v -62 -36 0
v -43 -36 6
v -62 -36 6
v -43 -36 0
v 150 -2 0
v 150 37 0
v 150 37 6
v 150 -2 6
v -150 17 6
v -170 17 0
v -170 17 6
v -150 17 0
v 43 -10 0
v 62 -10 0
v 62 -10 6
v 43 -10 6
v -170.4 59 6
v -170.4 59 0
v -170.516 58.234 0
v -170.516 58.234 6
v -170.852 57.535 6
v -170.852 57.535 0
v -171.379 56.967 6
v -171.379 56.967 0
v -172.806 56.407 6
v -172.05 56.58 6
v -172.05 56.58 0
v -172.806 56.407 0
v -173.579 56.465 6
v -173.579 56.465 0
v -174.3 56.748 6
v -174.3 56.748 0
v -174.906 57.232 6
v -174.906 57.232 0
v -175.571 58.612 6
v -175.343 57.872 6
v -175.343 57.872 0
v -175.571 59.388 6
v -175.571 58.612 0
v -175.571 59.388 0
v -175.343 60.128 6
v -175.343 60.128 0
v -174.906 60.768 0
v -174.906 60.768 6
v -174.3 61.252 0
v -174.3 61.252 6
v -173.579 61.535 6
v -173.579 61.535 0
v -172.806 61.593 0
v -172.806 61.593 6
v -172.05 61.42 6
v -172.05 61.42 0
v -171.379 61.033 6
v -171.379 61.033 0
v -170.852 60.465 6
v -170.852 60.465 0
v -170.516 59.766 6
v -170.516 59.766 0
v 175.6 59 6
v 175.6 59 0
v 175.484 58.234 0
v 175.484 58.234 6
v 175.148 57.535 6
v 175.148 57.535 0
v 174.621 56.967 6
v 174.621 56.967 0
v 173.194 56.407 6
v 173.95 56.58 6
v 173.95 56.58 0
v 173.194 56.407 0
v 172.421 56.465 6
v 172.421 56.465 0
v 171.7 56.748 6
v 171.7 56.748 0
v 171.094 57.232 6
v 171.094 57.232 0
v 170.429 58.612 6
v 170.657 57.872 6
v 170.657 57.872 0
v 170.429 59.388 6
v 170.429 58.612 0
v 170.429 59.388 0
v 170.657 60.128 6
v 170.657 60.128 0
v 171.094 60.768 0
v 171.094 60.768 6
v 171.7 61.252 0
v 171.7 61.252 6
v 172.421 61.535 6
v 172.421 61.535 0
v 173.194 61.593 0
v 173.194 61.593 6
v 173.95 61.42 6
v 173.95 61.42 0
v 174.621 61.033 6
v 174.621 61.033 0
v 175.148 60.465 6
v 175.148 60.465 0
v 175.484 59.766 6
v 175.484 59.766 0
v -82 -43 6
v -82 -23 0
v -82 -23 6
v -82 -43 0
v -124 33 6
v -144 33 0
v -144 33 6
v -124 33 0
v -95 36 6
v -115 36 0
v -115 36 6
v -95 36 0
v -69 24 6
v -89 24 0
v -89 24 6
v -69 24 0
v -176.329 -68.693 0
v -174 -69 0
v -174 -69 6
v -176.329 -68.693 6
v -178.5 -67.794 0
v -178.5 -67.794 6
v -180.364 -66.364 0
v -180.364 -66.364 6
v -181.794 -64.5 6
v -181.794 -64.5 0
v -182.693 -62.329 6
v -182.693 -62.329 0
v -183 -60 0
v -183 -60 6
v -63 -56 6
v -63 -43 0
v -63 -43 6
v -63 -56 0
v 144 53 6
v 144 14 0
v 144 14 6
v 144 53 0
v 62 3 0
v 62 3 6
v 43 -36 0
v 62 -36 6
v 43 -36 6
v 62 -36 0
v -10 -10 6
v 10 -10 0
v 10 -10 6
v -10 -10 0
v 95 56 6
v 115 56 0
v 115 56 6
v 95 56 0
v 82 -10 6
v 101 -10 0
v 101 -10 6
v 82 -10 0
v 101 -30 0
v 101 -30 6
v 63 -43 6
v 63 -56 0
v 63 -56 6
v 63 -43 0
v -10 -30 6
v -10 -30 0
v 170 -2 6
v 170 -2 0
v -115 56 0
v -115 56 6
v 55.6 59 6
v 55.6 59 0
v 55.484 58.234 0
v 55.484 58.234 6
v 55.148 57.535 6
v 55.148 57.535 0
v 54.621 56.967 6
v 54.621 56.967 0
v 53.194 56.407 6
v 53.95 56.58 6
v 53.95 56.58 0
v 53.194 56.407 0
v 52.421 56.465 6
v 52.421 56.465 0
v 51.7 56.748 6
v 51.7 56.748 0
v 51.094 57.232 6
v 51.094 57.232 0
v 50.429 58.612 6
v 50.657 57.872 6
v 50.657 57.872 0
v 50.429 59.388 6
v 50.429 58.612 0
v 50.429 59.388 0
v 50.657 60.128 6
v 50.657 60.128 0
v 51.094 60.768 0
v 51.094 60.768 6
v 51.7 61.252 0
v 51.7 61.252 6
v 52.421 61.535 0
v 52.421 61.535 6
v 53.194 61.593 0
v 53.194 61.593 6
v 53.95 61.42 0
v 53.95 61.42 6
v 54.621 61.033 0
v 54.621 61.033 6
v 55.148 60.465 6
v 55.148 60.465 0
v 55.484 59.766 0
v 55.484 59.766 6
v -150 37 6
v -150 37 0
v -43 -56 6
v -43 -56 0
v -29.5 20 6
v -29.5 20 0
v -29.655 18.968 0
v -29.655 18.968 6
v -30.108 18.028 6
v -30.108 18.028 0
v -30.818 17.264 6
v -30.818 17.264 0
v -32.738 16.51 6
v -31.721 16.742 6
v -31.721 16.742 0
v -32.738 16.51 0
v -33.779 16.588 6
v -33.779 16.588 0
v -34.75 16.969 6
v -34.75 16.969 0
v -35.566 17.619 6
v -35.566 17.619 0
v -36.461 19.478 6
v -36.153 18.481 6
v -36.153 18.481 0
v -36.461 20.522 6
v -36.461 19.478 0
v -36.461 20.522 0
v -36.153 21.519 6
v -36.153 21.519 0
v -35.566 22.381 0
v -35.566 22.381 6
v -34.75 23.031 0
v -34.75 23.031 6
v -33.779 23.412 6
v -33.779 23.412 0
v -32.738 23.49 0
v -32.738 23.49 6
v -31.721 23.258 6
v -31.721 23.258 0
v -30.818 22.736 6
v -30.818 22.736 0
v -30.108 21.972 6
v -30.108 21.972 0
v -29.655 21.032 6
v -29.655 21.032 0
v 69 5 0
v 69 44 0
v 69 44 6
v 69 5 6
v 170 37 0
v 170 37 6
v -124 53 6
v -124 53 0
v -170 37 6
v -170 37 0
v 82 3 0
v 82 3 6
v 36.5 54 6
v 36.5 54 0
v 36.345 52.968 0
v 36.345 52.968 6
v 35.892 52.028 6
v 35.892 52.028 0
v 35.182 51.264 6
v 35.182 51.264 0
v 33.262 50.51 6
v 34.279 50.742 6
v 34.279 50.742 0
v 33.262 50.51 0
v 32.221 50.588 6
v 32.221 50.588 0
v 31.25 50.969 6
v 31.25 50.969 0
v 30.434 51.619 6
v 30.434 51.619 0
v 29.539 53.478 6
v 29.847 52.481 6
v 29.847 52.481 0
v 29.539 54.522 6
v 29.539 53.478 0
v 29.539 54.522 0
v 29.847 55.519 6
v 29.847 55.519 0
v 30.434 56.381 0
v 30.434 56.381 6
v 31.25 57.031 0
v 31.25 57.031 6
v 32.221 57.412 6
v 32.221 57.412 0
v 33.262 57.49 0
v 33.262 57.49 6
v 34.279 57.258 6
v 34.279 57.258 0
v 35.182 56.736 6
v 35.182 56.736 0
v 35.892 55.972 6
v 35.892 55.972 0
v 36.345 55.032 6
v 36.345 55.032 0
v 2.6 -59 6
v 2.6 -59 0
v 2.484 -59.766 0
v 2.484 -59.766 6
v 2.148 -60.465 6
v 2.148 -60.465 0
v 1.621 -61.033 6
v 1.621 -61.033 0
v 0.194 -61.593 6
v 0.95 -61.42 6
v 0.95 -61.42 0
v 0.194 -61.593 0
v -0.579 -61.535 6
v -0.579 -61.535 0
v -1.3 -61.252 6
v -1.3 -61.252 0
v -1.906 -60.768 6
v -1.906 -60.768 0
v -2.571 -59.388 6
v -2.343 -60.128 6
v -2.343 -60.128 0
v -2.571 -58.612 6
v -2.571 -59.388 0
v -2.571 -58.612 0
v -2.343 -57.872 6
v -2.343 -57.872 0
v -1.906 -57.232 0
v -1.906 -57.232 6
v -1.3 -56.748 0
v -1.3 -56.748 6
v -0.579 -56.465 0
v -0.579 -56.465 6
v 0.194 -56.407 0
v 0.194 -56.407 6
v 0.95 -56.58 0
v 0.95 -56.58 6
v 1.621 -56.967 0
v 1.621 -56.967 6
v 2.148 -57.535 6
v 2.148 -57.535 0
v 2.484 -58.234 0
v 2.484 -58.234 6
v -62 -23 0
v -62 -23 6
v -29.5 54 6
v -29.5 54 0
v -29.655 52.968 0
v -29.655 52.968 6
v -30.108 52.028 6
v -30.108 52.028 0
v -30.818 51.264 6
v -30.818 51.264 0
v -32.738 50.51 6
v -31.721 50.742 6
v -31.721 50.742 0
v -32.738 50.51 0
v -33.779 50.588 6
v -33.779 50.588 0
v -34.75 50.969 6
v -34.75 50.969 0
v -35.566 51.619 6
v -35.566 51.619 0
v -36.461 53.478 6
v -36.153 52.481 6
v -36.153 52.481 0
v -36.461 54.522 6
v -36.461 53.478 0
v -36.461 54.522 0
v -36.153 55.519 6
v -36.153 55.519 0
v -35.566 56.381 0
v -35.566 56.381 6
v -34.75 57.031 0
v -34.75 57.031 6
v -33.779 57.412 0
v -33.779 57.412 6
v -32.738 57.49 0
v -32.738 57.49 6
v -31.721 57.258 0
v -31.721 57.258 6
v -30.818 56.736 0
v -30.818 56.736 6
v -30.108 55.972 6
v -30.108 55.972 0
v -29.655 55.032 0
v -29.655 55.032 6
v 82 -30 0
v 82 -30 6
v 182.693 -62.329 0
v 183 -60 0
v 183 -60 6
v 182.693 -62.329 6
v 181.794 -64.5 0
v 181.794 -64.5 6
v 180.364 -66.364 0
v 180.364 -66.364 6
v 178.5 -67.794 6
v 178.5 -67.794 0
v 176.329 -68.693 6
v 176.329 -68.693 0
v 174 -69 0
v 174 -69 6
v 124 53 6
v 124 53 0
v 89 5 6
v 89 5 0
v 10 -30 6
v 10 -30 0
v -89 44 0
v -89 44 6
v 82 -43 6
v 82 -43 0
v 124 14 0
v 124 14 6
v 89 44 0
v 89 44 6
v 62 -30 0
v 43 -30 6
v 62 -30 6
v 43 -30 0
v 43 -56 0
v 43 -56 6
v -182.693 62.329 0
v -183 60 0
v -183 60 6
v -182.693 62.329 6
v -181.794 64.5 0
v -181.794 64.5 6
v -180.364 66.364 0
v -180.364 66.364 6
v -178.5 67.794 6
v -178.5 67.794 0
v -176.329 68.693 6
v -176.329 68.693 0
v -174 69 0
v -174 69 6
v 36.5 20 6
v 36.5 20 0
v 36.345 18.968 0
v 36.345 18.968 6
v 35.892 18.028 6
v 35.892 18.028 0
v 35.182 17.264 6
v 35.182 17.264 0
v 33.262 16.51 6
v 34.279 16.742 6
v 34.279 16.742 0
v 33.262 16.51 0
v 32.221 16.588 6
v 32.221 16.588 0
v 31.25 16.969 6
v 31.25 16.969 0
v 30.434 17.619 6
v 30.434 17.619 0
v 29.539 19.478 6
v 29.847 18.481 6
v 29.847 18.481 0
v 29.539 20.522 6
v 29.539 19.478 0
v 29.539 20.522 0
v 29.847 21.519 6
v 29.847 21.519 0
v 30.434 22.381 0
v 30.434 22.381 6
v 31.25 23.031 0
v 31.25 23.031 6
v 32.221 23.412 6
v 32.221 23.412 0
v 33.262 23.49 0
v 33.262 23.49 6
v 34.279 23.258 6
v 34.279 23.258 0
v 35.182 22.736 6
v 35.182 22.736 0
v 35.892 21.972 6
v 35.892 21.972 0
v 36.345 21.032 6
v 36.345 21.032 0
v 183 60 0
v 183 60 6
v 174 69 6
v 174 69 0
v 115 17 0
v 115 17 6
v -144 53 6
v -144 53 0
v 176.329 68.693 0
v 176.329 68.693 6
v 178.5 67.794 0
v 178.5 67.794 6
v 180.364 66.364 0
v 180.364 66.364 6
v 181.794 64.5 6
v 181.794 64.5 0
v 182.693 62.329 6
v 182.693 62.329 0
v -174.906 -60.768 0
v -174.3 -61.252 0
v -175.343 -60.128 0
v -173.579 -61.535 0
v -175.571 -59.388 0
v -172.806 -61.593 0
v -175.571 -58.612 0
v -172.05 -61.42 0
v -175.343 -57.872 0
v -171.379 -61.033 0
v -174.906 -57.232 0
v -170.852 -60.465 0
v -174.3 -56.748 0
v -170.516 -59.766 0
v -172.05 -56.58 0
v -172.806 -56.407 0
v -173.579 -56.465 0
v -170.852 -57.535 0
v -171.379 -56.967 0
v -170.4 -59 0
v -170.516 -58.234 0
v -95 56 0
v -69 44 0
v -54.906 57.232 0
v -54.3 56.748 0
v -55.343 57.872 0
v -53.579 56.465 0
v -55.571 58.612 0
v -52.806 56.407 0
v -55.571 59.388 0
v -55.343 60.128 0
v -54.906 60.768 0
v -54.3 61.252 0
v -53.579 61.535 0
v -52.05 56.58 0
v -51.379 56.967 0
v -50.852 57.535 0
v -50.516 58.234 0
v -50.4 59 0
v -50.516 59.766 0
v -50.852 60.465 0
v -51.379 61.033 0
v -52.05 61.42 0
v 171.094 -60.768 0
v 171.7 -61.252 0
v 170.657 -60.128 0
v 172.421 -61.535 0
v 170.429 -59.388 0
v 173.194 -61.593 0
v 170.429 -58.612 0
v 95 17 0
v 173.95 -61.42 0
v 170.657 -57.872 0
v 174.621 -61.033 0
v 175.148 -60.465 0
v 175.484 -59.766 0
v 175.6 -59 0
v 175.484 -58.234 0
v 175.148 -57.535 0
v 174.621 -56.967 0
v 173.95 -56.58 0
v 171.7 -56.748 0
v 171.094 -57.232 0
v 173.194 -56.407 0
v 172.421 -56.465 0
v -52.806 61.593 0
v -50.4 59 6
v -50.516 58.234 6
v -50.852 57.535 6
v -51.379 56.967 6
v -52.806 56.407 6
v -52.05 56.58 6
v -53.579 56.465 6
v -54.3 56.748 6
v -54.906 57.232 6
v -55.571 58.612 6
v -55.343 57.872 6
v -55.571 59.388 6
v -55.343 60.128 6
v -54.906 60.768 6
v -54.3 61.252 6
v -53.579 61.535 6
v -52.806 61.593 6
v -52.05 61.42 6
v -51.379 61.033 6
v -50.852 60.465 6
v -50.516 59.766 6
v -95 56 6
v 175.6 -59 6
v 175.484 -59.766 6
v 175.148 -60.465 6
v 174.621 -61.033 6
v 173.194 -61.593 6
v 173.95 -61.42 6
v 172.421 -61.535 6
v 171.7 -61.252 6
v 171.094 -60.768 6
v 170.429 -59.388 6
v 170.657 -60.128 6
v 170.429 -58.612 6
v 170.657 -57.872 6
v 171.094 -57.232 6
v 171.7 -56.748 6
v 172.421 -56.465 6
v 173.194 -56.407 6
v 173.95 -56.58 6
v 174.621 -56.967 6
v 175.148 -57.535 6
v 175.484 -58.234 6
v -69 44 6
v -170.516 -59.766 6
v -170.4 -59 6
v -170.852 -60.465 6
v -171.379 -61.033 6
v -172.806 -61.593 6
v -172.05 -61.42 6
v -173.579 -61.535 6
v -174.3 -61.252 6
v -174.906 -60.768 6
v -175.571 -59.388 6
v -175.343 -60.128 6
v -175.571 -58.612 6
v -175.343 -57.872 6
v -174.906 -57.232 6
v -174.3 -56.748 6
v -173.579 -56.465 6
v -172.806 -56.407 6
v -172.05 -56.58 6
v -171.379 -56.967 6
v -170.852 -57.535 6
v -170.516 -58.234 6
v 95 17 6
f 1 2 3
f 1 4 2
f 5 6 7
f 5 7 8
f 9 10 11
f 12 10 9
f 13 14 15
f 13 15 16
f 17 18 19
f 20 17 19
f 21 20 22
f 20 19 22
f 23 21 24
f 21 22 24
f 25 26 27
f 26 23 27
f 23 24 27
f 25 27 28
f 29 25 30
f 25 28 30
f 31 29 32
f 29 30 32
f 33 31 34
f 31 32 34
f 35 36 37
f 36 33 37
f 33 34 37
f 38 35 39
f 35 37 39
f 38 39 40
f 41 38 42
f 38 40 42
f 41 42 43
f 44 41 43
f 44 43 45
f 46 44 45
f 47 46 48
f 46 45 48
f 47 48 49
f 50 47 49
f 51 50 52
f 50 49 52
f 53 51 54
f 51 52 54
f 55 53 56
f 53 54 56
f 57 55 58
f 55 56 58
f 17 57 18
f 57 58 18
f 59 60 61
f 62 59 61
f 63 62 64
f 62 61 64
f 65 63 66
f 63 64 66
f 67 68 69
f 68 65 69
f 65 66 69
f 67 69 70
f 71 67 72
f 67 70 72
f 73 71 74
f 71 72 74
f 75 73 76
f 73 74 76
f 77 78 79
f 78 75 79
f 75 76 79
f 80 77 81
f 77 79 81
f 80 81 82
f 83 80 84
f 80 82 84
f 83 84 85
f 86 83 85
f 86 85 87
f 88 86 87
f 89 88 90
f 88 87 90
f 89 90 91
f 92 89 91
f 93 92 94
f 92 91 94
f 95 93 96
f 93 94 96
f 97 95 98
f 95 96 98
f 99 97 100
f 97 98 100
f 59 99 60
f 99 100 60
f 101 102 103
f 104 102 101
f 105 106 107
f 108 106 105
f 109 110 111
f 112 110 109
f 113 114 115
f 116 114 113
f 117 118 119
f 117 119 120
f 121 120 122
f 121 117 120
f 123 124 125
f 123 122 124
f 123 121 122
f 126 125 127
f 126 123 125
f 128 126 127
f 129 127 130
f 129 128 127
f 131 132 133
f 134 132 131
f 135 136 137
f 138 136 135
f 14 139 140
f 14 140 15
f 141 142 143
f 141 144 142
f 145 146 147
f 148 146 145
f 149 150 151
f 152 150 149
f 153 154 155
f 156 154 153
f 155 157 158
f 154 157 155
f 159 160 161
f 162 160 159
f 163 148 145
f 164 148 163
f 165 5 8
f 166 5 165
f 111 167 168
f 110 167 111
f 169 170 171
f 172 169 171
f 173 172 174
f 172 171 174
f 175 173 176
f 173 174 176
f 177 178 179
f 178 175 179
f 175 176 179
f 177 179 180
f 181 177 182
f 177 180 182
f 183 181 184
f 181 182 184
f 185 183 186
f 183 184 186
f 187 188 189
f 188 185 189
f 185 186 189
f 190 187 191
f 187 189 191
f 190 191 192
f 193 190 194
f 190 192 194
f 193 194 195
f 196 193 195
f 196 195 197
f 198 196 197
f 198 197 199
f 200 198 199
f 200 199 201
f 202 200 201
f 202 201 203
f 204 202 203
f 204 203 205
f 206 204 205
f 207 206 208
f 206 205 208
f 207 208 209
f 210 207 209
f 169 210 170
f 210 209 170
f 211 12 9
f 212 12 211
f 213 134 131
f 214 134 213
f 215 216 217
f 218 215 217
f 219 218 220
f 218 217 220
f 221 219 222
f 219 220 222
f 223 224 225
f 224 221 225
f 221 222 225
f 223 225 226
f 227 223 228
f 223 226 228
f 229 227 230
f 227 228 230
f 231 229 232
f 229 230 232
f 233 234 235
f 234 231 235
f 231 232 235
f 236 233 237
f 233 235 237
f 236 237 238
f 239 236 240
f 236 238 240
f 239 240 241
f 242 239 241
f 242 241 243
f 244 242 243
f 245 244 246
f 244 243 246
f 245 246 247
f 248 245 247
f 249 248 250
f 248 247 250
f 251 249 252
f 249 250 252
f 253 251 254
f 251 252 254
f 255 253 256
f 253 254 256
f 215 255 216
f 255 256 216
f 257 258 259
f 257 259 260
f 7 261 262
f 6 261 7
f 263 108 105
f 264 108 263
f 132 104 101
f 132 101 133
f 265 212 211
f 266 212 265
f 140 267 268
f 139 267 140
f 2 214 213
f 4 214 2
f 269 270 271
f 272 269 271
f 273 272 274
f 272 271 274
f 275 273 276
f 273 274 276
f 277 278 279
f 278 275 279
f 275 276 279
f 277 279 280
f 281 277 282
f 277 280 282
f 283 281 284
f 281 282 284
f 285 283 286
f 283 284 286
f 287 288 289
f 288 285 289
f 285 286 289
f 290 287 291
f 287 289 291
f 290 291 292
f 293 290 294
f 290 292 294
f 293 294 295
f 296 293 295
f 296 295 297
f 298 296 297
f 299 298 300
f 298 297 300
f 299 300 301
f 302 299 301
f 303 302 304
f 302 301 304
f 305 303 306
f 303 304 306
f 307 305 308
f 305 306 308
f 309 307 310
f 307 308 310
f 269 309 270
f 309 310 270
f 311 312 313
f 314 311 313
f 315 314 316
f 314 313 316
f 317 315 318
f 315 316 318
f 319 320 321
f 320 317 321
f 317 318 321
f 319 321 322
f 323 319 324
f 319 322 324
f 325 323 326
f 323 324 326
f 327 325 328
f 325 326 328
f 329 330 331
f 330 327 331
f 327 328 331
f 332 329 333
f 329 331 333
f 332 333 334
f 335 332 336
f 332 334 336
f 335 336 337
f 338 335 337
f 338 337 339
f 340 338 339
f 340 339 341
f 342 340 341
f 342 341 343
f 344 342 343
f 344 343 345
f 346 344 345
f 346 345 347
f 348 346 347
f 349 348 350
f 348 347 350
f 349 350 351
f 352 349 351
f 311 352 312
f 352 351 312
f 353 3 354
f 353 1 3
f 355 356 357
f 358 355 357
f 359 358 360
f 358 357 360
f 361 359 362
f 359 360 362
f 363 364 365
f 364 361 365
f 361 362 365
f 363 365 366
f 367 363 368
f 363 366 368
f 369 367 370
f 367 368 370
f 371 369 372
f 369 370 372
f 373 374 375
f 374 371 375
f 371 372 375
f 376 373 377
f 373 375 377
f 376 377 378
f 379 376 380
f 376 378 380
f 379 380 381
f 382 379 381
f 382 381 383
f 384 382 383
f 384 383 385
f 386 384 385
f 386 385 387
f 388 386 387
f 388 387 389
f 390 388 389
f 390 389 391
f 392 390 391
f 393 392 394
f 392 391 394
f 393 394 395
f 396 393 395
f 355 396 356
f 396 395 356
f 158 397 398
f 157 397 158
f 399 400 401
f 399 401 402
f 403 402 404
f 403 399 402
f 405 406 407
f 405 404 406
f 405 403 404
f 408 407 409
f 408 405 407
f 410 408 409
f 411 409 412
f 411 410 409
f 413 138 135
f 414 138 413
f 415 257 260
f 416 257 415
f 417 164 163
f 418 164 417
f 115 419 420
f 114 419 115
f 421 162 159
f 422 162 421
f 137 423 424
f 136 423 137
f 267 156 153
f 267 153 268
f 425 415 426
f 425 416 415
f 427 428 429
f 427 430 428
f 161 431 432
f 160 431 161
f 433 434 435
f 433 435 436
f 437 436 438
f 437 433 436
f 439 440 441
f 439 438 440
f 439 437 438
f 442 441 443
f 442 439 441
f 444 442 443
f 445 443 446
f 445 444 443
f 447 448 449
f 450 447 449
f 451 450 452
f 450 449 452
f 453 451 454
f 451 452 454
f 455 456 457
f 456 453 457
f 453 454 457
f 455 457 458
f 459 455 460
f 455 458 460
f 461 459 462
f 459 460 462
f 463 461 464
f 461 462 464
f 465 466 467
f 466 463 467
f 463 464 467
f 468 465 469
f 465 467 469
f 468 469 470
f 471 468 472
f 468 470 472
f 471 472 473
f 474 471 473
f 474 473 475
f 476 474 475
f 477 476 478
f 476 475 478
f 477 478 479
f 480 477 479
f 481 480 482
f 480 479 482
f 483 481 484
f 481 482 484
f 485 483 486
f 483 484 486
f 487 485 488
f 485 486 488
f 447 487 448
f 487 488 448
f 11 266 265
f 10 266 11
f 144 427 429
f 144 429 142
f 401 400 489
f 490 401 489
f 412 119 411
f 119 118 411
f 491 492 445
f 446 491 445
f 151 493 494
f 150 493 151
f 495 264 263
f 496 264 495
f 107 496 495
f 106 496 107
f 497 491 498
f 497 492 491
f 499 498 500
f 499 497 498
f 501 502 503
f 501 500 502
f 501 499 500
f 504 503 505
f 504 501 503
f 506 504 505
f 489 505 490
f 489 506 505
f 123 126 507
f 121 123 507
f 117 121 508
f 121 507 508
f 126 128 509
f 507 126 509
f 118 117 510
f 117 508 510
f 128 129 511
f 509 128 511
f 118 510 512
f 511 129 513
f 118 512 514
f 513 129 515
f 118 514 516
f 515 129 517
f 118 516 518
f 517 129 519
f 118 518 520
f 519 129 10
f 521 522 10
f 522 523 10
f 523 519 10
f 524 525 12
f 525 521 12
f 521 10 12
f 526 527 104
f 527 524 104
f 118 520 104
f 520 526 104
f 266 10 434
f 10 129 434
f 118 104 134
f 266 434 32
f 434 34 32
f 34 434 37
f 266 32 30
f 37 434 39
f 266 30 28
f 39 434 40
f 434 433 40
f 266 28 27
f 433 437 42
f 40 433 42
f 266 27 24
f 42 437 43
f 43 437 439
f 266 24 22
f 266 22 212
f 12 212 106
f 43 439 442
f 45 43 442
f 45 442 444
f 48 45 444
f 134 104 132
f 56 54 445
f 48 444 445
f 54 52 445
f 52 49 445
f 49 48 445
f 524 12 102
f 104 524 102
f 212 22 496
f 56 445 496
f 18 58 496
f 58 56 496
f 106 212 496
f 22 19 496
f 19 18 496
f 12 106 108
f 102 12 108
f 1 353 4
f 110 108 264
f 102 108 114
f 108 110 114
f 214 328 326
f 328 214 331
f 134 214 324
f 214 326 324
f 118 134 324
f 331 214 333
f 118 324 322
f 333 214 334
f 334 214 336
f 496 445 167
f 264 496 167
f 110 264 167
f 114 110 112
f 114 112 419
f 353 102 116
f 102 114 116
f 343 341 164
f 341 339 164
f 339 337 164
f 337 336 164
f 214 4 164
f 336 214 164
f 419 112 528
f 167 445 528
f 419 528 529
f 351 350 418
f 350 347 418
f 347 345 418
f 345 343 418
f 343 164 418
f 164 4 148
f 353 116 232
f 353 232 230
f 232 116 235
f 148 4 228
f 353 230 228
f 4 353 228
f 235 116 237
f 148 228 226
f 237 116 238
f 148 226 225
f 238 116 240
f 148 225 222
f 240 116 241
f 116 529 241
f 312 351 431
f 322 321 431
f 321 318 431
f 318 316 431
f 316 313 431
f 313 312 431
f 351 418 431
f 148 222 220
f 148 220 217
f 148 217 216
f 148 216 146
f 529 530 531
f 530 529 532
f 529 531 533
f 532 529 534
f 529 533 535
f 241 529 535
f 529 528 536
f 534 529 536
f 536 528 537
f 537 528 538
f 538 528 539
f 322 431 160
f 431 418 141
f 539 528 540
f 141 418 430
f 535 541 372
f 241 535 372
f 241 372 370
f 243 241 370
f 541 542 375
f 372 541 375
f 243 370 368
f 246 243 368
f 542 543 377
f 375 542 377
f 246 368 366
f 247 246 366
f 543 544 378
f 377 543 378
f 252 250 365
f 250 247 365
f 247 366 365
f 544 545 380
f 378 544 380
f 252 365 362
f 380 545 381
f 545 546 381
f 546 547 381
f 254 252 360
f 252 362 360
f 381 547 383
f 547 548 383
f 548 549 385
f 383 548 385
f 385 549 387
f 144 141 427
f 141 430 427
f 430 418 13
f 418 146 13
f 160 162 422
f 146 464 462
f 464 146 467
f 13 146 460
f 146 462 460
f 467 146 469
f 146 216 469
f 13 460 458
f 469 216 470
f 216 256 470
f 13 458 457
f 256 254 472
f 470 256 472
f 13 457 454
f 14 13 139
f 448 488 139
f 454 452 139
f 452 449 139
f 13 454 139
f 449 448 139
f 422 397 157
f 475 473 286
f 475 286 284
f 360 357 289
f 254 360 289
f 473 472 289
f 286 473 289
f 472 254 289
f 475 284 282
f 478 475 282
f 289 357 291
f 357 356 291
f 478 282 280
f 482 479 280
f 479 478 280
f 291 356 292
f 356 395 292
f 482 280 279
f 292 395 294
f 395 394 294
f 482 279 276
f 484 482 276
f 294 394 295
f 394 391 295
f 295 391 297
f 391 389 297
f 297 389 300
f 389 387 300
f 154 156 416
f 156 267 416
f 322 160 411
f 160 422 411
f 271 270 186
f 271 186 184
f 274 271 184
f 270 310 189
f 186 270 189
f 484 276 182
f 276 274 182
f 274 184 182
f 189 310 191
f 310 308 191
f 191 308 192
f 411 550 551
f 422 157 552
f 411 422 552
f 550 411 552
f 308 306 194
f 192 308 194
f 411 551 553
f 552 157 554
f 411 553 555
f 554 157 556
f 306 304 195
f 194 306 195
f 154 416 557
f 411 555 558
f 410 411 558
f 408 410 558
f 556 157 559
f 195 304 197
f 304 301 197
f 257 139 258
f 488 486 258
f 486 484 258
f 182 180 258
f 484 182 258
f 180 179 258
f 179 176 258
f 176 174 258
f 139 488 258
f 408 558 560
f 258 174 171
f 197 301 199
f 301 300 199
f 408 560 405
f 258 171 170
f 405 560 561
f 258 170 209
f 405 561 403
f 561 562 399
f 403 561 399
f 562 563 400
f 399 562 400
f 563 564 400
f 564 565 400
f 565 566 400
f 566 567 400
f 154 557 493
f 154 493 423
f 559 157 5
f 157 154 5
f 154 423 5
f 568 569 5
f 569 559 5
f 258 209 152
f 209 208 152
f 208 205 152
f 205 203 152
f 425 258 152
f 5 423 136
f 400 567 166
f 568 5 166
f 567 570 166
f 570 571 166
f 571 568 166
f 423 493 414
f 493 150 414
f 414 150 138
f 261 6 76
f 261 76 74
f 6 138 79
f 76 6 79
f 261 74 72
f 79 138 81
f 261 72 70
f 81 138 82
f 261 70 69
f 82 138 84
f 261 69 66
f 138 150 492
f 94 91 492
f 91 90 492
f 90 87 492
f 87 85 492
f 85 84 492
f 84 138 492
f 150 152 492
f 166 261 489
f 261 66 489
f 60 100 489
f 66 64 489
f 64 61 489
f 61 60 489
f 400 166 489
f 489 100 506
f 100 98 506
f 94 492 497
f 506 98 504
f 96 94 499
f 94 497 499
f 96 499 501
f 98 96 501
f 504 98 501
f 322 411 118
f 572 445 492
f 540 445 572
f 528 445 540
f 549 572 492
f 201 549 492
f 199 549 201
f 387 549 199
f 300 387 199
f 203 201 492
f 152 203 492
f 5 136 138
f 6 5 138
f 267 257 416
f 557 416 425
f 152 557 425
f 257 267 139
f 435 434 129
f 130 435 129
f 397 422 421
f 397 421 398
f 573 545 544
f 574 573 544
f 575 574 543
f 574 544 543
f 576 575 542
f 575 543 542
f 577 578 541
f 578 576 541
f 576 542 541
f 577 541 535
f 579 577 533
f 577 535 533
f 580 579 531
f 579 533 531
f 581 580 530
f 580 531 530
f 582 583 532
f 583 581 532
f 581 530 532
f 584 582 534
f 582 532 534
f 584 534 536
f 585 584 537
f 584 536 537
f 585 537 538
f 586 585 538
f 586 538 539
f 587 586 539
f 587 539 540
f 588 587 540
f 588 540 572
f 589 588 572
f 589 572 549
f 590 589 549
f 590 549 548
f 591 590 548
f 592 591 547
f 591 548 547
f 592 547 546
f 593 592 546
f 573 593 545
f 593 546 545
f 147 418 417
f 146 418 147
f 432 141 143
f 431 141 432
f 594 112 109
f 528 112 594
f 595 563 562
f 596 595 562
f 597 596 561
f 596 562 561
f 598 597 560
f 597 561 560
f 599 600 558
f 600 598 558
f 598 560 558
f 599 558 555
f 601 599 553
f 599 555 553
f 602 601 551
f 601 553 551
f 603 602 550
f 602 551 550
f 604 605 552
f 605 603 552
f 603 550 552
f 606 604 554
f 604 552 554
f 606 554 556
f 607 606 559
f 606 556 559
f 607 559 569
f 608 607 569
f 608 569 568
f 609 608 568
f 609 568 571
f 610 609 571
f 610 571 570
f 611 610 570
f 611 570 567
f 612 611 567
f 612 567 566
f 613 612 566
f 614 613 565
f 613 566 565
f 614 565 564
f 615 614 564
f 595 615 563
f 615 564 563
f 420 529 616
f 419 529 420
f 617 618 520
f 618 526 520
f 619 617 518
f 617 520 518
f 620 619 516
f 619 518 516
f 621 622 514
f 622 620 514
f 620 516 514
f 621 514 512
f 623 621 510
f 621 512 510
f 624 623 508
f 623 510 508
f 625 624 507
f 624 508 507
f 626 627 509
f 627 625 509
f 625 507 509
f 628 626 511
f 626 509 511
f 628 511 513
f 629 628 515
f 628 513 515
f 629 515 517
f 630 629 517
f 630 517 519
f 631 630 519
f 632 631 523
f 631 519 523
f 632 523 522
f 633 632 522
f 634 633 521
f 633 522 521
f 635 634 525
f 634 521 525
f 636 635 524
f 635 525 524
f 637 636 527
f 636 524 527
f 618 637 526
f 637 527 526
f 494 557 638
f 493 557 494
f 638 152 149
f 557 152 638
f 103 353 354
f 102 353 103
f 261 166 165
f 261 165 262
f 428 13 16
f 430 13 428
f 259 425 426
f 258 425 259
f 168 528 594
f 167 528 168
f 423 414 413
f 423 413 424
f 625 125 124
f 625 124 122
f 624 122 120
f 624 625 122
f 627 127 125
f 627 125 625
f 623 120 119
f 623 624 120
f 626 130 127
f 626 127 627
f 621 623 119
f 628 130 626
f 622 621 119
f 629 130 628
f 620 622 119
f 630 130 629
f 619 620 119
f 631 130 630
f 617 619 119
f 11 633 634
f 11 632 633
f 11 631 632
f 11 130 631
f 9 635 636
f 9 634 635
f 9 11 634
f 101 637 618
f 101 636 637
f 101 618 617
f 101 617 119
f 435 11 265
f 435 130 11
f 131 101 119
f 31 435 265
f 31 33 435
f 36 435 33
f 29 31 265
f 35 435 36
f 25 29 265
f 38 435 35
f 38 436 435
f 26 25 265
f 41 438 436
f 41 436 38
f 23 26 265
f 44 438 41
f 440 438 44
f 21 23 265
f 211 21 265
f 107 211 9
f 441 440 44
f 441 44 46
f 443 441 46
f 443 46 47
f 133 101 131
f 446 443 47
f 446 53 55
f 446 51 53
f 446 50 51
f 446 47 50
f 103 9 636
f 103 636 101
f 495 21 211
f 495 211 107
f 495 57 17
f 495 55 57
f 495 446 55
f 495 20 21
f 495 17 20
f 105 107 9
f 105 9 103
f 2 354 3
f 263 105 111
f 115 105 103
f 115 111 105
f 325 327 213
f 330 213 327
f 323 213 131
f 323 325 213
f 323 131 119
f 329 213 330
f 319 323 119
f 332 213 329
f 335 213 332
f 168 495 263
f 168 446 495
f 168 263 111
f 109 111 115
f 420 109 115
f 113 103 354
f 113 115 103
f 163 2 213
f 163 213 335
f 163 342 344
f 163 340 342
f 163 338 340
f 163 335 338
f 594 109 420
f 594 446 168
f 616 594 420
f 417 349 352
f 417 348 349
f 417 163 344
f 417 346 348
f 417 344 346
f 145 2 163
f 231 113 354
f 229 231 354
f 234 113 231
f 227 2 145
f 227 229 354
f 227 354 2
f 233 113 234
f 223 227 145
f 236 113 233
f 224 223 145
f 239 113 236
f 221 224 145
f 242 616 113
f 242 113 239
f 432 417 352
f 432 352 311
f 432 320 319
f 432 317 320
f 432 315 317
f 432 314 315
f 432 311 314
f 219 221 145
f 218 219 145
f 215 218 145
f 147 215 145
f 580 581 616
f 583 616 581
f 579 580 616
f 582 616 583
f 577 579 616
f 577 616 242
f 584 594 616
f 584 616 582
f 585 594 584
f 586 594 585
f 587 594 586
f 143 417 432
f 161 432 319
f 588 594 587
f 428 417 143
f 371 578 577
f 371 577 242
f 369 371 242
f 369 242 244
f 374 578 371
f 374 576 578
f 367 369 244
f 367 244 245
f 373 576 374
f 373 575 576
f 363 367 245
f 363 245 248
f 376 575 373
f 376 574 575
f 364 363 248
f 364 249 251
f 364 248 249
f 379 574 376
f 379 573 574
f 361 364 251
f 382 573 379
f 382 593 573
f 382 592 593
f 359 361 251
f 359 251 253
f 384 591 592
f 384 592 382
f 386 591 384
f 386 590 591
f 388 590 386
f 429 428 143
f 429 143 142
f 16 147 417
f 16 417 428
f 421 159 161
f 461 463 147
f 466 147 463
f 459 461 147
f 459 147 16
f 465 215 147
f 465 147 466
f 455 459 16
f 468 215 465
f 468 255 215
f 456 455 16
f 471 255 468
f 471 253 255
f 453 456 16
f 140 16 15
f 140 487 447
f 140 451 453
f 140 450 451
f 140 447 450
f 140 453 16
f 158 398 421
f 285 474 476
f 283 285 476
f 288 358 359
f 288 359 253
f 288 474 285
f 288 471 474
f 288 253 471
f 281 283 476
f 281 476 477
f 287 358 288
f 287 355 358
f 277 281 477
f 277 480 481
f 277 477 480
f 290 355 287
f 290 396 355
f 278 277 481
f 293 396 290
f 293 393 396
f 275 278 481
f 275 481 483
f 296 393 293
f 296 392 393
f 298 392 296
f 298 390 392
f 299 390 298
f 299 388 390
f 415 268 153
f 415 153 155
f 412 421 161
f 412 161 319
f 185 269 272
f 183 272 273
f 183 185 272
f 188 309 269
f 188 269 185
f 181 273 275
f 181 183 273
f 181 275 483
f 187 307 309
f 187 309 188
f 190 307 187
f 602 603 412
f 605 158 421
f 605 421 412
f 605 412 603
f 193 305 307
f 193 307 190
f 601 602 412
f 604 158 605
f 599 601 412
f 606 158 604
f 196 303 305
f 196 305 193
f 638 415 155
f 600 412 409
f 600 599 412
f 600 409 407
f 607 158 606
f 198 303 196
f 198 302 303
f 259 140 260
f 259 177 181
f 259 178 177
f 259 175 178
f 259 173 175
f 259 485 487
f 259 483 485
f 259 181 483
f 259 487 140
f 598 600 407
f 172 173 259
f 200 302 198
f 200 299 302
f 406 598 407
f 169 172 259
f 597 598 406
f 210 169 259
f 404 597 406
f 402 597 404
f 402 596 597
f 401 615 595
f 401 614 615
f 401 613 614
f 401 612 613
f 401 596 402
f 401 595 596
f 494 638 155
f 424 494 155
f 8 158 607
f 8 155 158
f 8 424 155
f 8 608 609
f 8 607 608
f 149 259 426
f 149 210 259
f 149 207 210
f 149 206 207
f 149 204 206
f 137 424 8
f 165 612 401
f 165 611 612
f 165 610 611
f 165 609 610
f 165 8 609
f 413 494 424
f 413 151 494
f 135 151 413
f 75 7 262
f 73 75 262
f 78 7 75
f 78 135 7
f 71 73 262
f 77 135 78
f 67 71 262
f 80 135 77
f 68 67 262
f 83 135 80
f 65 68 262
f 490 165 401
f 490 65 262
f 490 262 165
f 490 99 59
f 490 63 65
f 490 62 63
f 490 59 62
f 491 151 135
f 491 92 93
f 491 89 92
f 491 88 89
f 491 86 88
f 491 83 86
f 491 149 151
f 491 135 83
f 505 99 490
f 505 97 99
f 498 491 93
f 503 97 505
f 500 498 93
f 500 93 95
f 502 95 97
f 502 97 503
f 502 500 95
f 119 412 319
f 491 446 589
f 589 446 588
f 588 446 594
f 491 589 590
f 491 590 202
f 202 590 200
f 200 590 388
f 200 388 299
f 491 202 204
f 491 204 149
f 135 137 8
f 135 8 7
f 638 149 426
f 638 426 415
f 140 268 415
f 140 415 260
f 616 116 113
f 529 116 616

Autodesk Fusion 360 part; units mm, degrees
sketch "Sketch1" plane through (0, 0, 0) normal (0, 0, 1) x (1, 0, 0)
  line L0 (89, 44) -> (69, 44)
  line L1 (43, -56) -> (63, -56)
  line L2 (-89, 24) -> (-69, 24)
  line L3 (-124, 33) -> (-124, 53)
  line L4 (-95, 36) -> (-95, 56)
  line L5 (174, 69) -> (-174, 69)
  line L6 (-174, -69) -> (174, -69)
  line L7 (170, 37) -> (150, 37)
  line L8 (150, 37) -> (150, -2)
  line L9 (-183, 60) -> (-183, -60)
  line L10 (-124, 53) -> (-144, 53)
  line L11 (115, 56) -> (95, 56)
  line L12 (-150, 37) -> (-170, 37)
  line L13 (-170, 37) -> (-170, 17)
  line L14 (-89, 44) -> (-89, 24)
  line L15 (-62, -36) -> (-62, -23)
  line L16 (-115, 36) -> (-95, 36)
  line L17 (-69, 24) -> (-69, 44)
  line L18 (-69, 44) -> (-89, 44)
  line L19 (-62, -23) -> (-82, -23)
  line L20 (124, 14) -> (144, 14)
  line L21 (-144, 33) -> (-124, 33)
  circle A0 centre (173, -59) radius 2.6
  line L22 (-10, -30) -> (10, -30)
  line L23 (82, -30) -> (101, -30)
  line L24 (-43, -56) -> (-43, -36)
  line L25 (-63, -43) -> (-63, -56)
  line L26 (-82, -43) -> (-63, -43)
  circle A1 centre (-173, -59) radius 2.6
  line L27 (-144, 53) -> (-144, 33)
  line L28 (-10, -10) -> (-10, -30)
  line L29 (-150, 17) -> (-150, 37)
  line L30 (-115, 56) -> (-115, 36)
  line L31 (-63, -56) -> (-43, -56)
  line L32 (-170, 17) -> (-150, 17)
  line L33 (82, 3) -> (62, 3)
  line L34 (115, 17) -> (115, 56)
  line L35 (43, -30) -> (62, -30)
  line L36 (170, -2) -> (170, 37)
  line L37 (95, 56) -> (95, 17)
  line L38 (63, -43) -> (82, -43)
  line L39 (89, 5) -> (89, 44)
  circle A2 centre (0, -59) radius 2.6
  line L40 (183, -60) -> (183, 60)
  circle A3 centre (-173, 59) radius 2.6
  line L41 (43, -36) -> (43, -56)
  line L42 (62, 3) -> (62, -10)
  line L43 (69, 44) -> (69, 5)
  line L44 (10, -10) -> (-10, -10)
  line L45 (43, -10) -> (43, -30)
  line L46 (101, -30) -> (101, -10)
  line L47 (144, 53) -> (124, 53)
  line L48 (62, -10) -> (43, -10)
  line L49 (82, -43) -> (82, -30)
  line L50 (-95, 56) -> (-115, 56)
  line L51 (-82, -23) -> (-82, -43)
  line L52 (124, 53) -> (124, 14)
  line L53 (150, -2) -> (170, -2)
  circle A4 centre (173, 59) radius 2.6
  line L54 (62, -30) -> (62, -36)
  line L55 (10, -30) -> (10, -10)
  line L56 (95, 17) -> (115, 17)
  line L57 (101, -10) -> (82, -10)
  line L58 (62, -36) -> (43, -36)
  line L59 (82, -10) -> (82, 3)
  line L60 (63, -56) -> (63, -43)
  line L61 (69, 5) -> (89, 5)
  line L62 (144, 14) -> (144, 53)
  line L63 (-43, -36) -> (-62, -36)
  arc A5 (-174, 69) -> (-183, 60) centre (-174, 60) ccw
  arc A6 (183, 60) -> (174, 69) centre (174, 60) ccw
  arc A7 (174, -69) -> (183, -60) centre (174, -60) ccw
  arc A8 (-183, -60) -> (-174, -69) centre (-174, -60) ccw
  circle A9 centre (33, 54) radius 3.5
  circle A10 centre (-33, 54) radius 3.5
  circle A11 centre (33, 20) radius 3.5
  circle A12 centre (-33, 20) radius 3.5
  circle A13 centre (53, 59) radius 2.6
  circle A14 centre (-53, 59) radius 2.6
  dimension "d1" = 9
  dimension "d2" = 7
  dimension "d3" = 7
  dimension "d4" = 7
  dimension "d5" = 7
  dimension "d8" = 5.2
  dimension "d9" = 5.2
extrude "Extrude1" add sketch "Sketch1" along normal blind 6
